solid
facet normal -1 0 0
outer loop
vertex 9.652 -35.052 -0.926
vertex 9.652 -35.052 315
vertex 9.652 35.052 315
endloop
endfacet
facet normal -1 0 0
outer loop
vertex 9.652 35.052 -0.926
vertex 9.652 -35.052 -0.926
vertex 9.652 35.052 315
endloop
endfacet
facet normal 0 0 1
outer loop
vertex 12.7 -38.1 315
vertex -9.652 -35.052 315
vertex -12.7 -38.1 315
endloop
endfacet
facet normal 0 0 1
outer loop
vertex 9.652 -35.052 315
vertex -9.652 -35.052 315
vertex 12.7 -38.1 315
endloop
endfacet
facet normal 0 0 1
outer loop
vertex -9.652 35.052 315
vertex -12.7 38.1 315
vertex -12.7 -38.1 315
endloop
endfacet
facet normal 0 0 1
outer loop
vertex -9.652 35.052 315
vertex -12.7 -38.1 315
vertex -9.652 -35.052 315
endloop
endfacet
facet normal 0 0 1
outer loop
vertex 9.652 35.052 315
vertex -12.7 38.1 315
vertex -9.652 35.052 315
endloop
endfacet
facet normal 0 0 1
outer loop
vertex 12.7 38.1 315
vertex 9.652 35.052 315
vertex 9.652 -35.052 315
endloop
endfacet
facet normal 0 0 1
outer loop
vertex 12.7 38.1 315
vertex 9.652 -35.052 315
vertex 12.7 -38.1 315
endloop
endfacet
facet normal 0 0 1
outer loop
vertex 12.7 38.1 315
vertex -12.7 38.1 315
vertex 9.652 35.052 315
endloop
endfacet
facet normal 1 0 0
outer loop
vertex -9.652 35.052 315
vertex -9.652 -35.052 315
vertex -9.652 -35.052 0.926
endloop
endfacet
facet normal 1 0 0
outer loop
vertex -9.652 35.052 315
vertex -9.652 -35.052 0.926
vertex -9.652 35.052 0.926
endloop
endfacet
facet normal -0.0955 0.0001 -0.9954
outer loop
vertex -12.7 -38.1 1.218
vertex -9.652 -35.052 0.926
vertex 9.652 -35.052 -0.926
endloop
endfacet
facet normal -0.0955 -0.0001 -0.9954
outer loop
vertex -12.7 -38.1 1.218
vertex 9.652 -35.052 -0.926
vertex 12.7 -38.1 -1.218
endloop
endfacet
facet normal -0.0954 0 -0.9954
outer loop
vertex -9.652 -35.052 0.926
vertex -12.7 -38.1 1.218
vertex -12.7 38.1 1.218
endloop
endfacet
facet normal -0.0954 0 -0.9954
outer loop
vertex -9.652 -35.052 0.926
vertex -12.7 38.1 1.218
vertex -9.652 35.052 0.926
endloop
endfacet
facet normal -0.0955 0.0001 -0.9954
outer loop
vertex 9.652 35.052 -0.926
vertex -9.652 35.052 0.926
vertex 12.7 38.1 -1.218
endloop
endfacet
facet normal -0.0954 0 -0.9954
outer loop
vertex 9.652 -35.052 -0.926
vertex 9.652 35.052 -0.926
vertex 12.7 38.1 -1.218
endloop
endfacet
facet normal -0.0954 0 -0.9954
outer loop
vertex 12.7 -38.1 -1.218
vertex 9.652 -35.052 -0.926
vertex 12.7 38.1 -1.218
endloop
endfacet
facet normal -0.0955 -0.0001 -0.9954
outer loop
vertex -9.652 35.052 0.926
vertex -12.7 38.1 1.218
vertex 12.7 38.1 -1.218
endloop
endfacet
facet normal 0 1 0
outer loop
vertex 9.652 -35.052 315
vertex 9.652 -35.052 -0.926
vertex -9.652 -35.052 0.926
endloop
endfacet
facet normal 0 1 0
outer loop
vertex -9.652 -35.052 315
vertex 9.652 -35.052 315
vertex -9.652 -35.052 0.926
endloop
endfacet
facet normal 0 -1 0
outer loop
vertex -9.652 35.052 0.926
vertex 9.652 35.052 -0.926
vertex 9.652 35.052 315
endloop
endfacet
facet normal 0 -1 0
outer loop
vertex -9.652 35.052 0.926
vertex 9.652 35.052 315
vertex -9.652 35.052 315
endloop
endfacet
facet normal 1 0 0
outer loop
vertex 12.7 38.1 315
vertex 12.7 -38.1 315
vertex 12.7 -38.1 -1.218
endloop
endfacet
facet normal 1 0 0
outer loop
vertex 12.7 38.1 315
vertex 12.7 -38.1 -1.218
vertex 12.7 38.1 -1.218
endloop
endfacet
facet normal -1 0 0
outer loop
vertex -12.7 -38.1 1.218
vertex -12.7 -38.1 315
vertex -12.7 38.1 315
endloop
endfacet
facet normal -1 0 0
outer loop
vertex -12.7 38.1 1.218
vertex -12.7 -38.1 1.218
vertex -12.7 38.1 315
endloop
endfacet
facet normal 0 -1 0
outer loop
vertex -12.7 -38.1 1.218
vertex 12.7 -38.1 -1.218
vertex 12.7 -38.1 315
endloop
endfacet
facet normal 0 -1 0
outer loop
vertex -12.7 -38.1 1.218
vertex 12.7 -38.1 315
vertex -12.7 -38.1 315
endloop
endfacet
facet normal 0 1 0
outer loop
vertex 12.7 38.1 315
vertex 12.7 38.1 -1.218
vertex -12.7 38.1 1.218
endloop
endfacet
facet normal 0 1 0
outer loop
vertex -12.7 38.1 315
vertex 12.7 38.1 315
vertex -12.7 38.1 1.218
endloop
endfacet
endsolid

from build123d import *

# Parameters (mm, degrees)
SKETCH2_W               = 9.652
SKETCH2_H               = 3.048
SKETCH2_W_2             = 3.048
SKETCH2_H_2             = 35.052
BOSS_EXTRUDE1_DEPTH     = 315
SKETCH3_W               = 25.4
SKETCH3_H               = 76.2
SKETCH3_W_2             = 19.304
SKETCH3_H_2             = 70.104
BOSS_EXTRUDE2_DEPTH     = 50
CUT_EXTRUDE1_DEPTH      = 1
CUT_EXTRUDE1_DEPTH_BACK = 77.2


with BuildPart() as part:
    # Sketch2 → Boss-Extrude1 (new body)
    with BuildSketch(Plane.XY):
        Polygon((-12.7, 0), (-9.652, 0), (-9.652, 35.052), (-9.652, 38.1), (-12.7, 38.1), align=None)
        with Locations((-4.826, 36.576)):
            Rectangle(SKETCH2_W, SKETCH2_H)
        Polygon((0, 38.1), (0, 35.052), (9.652, 35.052), (9.652, 0), (12.7, 0), (12.7, 38.1), align=None)
        with Locations((11.176, -17.526)):
            Rectangle(SKETCH2_W_2, SKETCH2_H_2)
        Polygon((-9.652, -35.052), (-9.652, 0), (-12.7, 0), (-12.7, -38.1), (0, -38.1), (0, -35.052), align=None)
        Polygon((9.652, -35.052), (0, -35.052), (0, -38.1), (12.7, -38.1), (12.7, -35.052), align=None)
    extrude(amount=BOSS_EXTRUDE1_DEPTH)

    # Sketch3 → Boss-Extrude2 (add)
    with BuildSketch(Plane(origin=(0, 0, 0), x_dir=(-1, 0, 0), z_dir=(0, 0, -1))):
        Rectangle(SKETCH3_W, SKETCH3_H)
        Rectangle(SKETCH3_W_2, SKETCH3_H_2, mode=Mode.SUBTRACT)
    extrude(amount=BOSS_EXTRUDE2_DEPTH)

    # Sketch4 → Cut-Extrude1 (cut, two sides)
    with BuildSketch(Plane(origin=(0, 38.1, 0), x_dir=(1, 0, 0), z_dir=(0, 1, 0))) as cut_extrude1_sk:
        Polygon((-12.7, 46.179632344), (-70.94979307, -6.803292614), (-12.7, -1.217788135), align=None)
        Polygon((-77.560178635, 62.134722349), (-70.94979307, -6.803292614), (-12.7, 46.179632344), (-12.7, 50), (12.7, 50), (12.7, 1.217788135), (70.94979307, 6.803292614), (64.339407504, 75.741307577), align=None)
        Polygon((-12.7, 46.179632344), (-12.7, -1.217788135), (0, 0), (-9.501519639, 49.088910403), align=None)
        Polygon((-12.7, 50), (-12.7, 46.179632344), (-9.501519639, 49.088910403), (0, 0), (12.7, 1.217788135), (12.7, 50), align=None)
    extrude(amount=CUT_EXTRUDE1_DEPTH, mode=Mode.SUBTRACT)
    extrude(cut_extrude1_sk.sketch, amount=-CUT_EXTRUDE1_DEPTH_BACK, mode=Mode.SUBTRACT)


solid = part.part
